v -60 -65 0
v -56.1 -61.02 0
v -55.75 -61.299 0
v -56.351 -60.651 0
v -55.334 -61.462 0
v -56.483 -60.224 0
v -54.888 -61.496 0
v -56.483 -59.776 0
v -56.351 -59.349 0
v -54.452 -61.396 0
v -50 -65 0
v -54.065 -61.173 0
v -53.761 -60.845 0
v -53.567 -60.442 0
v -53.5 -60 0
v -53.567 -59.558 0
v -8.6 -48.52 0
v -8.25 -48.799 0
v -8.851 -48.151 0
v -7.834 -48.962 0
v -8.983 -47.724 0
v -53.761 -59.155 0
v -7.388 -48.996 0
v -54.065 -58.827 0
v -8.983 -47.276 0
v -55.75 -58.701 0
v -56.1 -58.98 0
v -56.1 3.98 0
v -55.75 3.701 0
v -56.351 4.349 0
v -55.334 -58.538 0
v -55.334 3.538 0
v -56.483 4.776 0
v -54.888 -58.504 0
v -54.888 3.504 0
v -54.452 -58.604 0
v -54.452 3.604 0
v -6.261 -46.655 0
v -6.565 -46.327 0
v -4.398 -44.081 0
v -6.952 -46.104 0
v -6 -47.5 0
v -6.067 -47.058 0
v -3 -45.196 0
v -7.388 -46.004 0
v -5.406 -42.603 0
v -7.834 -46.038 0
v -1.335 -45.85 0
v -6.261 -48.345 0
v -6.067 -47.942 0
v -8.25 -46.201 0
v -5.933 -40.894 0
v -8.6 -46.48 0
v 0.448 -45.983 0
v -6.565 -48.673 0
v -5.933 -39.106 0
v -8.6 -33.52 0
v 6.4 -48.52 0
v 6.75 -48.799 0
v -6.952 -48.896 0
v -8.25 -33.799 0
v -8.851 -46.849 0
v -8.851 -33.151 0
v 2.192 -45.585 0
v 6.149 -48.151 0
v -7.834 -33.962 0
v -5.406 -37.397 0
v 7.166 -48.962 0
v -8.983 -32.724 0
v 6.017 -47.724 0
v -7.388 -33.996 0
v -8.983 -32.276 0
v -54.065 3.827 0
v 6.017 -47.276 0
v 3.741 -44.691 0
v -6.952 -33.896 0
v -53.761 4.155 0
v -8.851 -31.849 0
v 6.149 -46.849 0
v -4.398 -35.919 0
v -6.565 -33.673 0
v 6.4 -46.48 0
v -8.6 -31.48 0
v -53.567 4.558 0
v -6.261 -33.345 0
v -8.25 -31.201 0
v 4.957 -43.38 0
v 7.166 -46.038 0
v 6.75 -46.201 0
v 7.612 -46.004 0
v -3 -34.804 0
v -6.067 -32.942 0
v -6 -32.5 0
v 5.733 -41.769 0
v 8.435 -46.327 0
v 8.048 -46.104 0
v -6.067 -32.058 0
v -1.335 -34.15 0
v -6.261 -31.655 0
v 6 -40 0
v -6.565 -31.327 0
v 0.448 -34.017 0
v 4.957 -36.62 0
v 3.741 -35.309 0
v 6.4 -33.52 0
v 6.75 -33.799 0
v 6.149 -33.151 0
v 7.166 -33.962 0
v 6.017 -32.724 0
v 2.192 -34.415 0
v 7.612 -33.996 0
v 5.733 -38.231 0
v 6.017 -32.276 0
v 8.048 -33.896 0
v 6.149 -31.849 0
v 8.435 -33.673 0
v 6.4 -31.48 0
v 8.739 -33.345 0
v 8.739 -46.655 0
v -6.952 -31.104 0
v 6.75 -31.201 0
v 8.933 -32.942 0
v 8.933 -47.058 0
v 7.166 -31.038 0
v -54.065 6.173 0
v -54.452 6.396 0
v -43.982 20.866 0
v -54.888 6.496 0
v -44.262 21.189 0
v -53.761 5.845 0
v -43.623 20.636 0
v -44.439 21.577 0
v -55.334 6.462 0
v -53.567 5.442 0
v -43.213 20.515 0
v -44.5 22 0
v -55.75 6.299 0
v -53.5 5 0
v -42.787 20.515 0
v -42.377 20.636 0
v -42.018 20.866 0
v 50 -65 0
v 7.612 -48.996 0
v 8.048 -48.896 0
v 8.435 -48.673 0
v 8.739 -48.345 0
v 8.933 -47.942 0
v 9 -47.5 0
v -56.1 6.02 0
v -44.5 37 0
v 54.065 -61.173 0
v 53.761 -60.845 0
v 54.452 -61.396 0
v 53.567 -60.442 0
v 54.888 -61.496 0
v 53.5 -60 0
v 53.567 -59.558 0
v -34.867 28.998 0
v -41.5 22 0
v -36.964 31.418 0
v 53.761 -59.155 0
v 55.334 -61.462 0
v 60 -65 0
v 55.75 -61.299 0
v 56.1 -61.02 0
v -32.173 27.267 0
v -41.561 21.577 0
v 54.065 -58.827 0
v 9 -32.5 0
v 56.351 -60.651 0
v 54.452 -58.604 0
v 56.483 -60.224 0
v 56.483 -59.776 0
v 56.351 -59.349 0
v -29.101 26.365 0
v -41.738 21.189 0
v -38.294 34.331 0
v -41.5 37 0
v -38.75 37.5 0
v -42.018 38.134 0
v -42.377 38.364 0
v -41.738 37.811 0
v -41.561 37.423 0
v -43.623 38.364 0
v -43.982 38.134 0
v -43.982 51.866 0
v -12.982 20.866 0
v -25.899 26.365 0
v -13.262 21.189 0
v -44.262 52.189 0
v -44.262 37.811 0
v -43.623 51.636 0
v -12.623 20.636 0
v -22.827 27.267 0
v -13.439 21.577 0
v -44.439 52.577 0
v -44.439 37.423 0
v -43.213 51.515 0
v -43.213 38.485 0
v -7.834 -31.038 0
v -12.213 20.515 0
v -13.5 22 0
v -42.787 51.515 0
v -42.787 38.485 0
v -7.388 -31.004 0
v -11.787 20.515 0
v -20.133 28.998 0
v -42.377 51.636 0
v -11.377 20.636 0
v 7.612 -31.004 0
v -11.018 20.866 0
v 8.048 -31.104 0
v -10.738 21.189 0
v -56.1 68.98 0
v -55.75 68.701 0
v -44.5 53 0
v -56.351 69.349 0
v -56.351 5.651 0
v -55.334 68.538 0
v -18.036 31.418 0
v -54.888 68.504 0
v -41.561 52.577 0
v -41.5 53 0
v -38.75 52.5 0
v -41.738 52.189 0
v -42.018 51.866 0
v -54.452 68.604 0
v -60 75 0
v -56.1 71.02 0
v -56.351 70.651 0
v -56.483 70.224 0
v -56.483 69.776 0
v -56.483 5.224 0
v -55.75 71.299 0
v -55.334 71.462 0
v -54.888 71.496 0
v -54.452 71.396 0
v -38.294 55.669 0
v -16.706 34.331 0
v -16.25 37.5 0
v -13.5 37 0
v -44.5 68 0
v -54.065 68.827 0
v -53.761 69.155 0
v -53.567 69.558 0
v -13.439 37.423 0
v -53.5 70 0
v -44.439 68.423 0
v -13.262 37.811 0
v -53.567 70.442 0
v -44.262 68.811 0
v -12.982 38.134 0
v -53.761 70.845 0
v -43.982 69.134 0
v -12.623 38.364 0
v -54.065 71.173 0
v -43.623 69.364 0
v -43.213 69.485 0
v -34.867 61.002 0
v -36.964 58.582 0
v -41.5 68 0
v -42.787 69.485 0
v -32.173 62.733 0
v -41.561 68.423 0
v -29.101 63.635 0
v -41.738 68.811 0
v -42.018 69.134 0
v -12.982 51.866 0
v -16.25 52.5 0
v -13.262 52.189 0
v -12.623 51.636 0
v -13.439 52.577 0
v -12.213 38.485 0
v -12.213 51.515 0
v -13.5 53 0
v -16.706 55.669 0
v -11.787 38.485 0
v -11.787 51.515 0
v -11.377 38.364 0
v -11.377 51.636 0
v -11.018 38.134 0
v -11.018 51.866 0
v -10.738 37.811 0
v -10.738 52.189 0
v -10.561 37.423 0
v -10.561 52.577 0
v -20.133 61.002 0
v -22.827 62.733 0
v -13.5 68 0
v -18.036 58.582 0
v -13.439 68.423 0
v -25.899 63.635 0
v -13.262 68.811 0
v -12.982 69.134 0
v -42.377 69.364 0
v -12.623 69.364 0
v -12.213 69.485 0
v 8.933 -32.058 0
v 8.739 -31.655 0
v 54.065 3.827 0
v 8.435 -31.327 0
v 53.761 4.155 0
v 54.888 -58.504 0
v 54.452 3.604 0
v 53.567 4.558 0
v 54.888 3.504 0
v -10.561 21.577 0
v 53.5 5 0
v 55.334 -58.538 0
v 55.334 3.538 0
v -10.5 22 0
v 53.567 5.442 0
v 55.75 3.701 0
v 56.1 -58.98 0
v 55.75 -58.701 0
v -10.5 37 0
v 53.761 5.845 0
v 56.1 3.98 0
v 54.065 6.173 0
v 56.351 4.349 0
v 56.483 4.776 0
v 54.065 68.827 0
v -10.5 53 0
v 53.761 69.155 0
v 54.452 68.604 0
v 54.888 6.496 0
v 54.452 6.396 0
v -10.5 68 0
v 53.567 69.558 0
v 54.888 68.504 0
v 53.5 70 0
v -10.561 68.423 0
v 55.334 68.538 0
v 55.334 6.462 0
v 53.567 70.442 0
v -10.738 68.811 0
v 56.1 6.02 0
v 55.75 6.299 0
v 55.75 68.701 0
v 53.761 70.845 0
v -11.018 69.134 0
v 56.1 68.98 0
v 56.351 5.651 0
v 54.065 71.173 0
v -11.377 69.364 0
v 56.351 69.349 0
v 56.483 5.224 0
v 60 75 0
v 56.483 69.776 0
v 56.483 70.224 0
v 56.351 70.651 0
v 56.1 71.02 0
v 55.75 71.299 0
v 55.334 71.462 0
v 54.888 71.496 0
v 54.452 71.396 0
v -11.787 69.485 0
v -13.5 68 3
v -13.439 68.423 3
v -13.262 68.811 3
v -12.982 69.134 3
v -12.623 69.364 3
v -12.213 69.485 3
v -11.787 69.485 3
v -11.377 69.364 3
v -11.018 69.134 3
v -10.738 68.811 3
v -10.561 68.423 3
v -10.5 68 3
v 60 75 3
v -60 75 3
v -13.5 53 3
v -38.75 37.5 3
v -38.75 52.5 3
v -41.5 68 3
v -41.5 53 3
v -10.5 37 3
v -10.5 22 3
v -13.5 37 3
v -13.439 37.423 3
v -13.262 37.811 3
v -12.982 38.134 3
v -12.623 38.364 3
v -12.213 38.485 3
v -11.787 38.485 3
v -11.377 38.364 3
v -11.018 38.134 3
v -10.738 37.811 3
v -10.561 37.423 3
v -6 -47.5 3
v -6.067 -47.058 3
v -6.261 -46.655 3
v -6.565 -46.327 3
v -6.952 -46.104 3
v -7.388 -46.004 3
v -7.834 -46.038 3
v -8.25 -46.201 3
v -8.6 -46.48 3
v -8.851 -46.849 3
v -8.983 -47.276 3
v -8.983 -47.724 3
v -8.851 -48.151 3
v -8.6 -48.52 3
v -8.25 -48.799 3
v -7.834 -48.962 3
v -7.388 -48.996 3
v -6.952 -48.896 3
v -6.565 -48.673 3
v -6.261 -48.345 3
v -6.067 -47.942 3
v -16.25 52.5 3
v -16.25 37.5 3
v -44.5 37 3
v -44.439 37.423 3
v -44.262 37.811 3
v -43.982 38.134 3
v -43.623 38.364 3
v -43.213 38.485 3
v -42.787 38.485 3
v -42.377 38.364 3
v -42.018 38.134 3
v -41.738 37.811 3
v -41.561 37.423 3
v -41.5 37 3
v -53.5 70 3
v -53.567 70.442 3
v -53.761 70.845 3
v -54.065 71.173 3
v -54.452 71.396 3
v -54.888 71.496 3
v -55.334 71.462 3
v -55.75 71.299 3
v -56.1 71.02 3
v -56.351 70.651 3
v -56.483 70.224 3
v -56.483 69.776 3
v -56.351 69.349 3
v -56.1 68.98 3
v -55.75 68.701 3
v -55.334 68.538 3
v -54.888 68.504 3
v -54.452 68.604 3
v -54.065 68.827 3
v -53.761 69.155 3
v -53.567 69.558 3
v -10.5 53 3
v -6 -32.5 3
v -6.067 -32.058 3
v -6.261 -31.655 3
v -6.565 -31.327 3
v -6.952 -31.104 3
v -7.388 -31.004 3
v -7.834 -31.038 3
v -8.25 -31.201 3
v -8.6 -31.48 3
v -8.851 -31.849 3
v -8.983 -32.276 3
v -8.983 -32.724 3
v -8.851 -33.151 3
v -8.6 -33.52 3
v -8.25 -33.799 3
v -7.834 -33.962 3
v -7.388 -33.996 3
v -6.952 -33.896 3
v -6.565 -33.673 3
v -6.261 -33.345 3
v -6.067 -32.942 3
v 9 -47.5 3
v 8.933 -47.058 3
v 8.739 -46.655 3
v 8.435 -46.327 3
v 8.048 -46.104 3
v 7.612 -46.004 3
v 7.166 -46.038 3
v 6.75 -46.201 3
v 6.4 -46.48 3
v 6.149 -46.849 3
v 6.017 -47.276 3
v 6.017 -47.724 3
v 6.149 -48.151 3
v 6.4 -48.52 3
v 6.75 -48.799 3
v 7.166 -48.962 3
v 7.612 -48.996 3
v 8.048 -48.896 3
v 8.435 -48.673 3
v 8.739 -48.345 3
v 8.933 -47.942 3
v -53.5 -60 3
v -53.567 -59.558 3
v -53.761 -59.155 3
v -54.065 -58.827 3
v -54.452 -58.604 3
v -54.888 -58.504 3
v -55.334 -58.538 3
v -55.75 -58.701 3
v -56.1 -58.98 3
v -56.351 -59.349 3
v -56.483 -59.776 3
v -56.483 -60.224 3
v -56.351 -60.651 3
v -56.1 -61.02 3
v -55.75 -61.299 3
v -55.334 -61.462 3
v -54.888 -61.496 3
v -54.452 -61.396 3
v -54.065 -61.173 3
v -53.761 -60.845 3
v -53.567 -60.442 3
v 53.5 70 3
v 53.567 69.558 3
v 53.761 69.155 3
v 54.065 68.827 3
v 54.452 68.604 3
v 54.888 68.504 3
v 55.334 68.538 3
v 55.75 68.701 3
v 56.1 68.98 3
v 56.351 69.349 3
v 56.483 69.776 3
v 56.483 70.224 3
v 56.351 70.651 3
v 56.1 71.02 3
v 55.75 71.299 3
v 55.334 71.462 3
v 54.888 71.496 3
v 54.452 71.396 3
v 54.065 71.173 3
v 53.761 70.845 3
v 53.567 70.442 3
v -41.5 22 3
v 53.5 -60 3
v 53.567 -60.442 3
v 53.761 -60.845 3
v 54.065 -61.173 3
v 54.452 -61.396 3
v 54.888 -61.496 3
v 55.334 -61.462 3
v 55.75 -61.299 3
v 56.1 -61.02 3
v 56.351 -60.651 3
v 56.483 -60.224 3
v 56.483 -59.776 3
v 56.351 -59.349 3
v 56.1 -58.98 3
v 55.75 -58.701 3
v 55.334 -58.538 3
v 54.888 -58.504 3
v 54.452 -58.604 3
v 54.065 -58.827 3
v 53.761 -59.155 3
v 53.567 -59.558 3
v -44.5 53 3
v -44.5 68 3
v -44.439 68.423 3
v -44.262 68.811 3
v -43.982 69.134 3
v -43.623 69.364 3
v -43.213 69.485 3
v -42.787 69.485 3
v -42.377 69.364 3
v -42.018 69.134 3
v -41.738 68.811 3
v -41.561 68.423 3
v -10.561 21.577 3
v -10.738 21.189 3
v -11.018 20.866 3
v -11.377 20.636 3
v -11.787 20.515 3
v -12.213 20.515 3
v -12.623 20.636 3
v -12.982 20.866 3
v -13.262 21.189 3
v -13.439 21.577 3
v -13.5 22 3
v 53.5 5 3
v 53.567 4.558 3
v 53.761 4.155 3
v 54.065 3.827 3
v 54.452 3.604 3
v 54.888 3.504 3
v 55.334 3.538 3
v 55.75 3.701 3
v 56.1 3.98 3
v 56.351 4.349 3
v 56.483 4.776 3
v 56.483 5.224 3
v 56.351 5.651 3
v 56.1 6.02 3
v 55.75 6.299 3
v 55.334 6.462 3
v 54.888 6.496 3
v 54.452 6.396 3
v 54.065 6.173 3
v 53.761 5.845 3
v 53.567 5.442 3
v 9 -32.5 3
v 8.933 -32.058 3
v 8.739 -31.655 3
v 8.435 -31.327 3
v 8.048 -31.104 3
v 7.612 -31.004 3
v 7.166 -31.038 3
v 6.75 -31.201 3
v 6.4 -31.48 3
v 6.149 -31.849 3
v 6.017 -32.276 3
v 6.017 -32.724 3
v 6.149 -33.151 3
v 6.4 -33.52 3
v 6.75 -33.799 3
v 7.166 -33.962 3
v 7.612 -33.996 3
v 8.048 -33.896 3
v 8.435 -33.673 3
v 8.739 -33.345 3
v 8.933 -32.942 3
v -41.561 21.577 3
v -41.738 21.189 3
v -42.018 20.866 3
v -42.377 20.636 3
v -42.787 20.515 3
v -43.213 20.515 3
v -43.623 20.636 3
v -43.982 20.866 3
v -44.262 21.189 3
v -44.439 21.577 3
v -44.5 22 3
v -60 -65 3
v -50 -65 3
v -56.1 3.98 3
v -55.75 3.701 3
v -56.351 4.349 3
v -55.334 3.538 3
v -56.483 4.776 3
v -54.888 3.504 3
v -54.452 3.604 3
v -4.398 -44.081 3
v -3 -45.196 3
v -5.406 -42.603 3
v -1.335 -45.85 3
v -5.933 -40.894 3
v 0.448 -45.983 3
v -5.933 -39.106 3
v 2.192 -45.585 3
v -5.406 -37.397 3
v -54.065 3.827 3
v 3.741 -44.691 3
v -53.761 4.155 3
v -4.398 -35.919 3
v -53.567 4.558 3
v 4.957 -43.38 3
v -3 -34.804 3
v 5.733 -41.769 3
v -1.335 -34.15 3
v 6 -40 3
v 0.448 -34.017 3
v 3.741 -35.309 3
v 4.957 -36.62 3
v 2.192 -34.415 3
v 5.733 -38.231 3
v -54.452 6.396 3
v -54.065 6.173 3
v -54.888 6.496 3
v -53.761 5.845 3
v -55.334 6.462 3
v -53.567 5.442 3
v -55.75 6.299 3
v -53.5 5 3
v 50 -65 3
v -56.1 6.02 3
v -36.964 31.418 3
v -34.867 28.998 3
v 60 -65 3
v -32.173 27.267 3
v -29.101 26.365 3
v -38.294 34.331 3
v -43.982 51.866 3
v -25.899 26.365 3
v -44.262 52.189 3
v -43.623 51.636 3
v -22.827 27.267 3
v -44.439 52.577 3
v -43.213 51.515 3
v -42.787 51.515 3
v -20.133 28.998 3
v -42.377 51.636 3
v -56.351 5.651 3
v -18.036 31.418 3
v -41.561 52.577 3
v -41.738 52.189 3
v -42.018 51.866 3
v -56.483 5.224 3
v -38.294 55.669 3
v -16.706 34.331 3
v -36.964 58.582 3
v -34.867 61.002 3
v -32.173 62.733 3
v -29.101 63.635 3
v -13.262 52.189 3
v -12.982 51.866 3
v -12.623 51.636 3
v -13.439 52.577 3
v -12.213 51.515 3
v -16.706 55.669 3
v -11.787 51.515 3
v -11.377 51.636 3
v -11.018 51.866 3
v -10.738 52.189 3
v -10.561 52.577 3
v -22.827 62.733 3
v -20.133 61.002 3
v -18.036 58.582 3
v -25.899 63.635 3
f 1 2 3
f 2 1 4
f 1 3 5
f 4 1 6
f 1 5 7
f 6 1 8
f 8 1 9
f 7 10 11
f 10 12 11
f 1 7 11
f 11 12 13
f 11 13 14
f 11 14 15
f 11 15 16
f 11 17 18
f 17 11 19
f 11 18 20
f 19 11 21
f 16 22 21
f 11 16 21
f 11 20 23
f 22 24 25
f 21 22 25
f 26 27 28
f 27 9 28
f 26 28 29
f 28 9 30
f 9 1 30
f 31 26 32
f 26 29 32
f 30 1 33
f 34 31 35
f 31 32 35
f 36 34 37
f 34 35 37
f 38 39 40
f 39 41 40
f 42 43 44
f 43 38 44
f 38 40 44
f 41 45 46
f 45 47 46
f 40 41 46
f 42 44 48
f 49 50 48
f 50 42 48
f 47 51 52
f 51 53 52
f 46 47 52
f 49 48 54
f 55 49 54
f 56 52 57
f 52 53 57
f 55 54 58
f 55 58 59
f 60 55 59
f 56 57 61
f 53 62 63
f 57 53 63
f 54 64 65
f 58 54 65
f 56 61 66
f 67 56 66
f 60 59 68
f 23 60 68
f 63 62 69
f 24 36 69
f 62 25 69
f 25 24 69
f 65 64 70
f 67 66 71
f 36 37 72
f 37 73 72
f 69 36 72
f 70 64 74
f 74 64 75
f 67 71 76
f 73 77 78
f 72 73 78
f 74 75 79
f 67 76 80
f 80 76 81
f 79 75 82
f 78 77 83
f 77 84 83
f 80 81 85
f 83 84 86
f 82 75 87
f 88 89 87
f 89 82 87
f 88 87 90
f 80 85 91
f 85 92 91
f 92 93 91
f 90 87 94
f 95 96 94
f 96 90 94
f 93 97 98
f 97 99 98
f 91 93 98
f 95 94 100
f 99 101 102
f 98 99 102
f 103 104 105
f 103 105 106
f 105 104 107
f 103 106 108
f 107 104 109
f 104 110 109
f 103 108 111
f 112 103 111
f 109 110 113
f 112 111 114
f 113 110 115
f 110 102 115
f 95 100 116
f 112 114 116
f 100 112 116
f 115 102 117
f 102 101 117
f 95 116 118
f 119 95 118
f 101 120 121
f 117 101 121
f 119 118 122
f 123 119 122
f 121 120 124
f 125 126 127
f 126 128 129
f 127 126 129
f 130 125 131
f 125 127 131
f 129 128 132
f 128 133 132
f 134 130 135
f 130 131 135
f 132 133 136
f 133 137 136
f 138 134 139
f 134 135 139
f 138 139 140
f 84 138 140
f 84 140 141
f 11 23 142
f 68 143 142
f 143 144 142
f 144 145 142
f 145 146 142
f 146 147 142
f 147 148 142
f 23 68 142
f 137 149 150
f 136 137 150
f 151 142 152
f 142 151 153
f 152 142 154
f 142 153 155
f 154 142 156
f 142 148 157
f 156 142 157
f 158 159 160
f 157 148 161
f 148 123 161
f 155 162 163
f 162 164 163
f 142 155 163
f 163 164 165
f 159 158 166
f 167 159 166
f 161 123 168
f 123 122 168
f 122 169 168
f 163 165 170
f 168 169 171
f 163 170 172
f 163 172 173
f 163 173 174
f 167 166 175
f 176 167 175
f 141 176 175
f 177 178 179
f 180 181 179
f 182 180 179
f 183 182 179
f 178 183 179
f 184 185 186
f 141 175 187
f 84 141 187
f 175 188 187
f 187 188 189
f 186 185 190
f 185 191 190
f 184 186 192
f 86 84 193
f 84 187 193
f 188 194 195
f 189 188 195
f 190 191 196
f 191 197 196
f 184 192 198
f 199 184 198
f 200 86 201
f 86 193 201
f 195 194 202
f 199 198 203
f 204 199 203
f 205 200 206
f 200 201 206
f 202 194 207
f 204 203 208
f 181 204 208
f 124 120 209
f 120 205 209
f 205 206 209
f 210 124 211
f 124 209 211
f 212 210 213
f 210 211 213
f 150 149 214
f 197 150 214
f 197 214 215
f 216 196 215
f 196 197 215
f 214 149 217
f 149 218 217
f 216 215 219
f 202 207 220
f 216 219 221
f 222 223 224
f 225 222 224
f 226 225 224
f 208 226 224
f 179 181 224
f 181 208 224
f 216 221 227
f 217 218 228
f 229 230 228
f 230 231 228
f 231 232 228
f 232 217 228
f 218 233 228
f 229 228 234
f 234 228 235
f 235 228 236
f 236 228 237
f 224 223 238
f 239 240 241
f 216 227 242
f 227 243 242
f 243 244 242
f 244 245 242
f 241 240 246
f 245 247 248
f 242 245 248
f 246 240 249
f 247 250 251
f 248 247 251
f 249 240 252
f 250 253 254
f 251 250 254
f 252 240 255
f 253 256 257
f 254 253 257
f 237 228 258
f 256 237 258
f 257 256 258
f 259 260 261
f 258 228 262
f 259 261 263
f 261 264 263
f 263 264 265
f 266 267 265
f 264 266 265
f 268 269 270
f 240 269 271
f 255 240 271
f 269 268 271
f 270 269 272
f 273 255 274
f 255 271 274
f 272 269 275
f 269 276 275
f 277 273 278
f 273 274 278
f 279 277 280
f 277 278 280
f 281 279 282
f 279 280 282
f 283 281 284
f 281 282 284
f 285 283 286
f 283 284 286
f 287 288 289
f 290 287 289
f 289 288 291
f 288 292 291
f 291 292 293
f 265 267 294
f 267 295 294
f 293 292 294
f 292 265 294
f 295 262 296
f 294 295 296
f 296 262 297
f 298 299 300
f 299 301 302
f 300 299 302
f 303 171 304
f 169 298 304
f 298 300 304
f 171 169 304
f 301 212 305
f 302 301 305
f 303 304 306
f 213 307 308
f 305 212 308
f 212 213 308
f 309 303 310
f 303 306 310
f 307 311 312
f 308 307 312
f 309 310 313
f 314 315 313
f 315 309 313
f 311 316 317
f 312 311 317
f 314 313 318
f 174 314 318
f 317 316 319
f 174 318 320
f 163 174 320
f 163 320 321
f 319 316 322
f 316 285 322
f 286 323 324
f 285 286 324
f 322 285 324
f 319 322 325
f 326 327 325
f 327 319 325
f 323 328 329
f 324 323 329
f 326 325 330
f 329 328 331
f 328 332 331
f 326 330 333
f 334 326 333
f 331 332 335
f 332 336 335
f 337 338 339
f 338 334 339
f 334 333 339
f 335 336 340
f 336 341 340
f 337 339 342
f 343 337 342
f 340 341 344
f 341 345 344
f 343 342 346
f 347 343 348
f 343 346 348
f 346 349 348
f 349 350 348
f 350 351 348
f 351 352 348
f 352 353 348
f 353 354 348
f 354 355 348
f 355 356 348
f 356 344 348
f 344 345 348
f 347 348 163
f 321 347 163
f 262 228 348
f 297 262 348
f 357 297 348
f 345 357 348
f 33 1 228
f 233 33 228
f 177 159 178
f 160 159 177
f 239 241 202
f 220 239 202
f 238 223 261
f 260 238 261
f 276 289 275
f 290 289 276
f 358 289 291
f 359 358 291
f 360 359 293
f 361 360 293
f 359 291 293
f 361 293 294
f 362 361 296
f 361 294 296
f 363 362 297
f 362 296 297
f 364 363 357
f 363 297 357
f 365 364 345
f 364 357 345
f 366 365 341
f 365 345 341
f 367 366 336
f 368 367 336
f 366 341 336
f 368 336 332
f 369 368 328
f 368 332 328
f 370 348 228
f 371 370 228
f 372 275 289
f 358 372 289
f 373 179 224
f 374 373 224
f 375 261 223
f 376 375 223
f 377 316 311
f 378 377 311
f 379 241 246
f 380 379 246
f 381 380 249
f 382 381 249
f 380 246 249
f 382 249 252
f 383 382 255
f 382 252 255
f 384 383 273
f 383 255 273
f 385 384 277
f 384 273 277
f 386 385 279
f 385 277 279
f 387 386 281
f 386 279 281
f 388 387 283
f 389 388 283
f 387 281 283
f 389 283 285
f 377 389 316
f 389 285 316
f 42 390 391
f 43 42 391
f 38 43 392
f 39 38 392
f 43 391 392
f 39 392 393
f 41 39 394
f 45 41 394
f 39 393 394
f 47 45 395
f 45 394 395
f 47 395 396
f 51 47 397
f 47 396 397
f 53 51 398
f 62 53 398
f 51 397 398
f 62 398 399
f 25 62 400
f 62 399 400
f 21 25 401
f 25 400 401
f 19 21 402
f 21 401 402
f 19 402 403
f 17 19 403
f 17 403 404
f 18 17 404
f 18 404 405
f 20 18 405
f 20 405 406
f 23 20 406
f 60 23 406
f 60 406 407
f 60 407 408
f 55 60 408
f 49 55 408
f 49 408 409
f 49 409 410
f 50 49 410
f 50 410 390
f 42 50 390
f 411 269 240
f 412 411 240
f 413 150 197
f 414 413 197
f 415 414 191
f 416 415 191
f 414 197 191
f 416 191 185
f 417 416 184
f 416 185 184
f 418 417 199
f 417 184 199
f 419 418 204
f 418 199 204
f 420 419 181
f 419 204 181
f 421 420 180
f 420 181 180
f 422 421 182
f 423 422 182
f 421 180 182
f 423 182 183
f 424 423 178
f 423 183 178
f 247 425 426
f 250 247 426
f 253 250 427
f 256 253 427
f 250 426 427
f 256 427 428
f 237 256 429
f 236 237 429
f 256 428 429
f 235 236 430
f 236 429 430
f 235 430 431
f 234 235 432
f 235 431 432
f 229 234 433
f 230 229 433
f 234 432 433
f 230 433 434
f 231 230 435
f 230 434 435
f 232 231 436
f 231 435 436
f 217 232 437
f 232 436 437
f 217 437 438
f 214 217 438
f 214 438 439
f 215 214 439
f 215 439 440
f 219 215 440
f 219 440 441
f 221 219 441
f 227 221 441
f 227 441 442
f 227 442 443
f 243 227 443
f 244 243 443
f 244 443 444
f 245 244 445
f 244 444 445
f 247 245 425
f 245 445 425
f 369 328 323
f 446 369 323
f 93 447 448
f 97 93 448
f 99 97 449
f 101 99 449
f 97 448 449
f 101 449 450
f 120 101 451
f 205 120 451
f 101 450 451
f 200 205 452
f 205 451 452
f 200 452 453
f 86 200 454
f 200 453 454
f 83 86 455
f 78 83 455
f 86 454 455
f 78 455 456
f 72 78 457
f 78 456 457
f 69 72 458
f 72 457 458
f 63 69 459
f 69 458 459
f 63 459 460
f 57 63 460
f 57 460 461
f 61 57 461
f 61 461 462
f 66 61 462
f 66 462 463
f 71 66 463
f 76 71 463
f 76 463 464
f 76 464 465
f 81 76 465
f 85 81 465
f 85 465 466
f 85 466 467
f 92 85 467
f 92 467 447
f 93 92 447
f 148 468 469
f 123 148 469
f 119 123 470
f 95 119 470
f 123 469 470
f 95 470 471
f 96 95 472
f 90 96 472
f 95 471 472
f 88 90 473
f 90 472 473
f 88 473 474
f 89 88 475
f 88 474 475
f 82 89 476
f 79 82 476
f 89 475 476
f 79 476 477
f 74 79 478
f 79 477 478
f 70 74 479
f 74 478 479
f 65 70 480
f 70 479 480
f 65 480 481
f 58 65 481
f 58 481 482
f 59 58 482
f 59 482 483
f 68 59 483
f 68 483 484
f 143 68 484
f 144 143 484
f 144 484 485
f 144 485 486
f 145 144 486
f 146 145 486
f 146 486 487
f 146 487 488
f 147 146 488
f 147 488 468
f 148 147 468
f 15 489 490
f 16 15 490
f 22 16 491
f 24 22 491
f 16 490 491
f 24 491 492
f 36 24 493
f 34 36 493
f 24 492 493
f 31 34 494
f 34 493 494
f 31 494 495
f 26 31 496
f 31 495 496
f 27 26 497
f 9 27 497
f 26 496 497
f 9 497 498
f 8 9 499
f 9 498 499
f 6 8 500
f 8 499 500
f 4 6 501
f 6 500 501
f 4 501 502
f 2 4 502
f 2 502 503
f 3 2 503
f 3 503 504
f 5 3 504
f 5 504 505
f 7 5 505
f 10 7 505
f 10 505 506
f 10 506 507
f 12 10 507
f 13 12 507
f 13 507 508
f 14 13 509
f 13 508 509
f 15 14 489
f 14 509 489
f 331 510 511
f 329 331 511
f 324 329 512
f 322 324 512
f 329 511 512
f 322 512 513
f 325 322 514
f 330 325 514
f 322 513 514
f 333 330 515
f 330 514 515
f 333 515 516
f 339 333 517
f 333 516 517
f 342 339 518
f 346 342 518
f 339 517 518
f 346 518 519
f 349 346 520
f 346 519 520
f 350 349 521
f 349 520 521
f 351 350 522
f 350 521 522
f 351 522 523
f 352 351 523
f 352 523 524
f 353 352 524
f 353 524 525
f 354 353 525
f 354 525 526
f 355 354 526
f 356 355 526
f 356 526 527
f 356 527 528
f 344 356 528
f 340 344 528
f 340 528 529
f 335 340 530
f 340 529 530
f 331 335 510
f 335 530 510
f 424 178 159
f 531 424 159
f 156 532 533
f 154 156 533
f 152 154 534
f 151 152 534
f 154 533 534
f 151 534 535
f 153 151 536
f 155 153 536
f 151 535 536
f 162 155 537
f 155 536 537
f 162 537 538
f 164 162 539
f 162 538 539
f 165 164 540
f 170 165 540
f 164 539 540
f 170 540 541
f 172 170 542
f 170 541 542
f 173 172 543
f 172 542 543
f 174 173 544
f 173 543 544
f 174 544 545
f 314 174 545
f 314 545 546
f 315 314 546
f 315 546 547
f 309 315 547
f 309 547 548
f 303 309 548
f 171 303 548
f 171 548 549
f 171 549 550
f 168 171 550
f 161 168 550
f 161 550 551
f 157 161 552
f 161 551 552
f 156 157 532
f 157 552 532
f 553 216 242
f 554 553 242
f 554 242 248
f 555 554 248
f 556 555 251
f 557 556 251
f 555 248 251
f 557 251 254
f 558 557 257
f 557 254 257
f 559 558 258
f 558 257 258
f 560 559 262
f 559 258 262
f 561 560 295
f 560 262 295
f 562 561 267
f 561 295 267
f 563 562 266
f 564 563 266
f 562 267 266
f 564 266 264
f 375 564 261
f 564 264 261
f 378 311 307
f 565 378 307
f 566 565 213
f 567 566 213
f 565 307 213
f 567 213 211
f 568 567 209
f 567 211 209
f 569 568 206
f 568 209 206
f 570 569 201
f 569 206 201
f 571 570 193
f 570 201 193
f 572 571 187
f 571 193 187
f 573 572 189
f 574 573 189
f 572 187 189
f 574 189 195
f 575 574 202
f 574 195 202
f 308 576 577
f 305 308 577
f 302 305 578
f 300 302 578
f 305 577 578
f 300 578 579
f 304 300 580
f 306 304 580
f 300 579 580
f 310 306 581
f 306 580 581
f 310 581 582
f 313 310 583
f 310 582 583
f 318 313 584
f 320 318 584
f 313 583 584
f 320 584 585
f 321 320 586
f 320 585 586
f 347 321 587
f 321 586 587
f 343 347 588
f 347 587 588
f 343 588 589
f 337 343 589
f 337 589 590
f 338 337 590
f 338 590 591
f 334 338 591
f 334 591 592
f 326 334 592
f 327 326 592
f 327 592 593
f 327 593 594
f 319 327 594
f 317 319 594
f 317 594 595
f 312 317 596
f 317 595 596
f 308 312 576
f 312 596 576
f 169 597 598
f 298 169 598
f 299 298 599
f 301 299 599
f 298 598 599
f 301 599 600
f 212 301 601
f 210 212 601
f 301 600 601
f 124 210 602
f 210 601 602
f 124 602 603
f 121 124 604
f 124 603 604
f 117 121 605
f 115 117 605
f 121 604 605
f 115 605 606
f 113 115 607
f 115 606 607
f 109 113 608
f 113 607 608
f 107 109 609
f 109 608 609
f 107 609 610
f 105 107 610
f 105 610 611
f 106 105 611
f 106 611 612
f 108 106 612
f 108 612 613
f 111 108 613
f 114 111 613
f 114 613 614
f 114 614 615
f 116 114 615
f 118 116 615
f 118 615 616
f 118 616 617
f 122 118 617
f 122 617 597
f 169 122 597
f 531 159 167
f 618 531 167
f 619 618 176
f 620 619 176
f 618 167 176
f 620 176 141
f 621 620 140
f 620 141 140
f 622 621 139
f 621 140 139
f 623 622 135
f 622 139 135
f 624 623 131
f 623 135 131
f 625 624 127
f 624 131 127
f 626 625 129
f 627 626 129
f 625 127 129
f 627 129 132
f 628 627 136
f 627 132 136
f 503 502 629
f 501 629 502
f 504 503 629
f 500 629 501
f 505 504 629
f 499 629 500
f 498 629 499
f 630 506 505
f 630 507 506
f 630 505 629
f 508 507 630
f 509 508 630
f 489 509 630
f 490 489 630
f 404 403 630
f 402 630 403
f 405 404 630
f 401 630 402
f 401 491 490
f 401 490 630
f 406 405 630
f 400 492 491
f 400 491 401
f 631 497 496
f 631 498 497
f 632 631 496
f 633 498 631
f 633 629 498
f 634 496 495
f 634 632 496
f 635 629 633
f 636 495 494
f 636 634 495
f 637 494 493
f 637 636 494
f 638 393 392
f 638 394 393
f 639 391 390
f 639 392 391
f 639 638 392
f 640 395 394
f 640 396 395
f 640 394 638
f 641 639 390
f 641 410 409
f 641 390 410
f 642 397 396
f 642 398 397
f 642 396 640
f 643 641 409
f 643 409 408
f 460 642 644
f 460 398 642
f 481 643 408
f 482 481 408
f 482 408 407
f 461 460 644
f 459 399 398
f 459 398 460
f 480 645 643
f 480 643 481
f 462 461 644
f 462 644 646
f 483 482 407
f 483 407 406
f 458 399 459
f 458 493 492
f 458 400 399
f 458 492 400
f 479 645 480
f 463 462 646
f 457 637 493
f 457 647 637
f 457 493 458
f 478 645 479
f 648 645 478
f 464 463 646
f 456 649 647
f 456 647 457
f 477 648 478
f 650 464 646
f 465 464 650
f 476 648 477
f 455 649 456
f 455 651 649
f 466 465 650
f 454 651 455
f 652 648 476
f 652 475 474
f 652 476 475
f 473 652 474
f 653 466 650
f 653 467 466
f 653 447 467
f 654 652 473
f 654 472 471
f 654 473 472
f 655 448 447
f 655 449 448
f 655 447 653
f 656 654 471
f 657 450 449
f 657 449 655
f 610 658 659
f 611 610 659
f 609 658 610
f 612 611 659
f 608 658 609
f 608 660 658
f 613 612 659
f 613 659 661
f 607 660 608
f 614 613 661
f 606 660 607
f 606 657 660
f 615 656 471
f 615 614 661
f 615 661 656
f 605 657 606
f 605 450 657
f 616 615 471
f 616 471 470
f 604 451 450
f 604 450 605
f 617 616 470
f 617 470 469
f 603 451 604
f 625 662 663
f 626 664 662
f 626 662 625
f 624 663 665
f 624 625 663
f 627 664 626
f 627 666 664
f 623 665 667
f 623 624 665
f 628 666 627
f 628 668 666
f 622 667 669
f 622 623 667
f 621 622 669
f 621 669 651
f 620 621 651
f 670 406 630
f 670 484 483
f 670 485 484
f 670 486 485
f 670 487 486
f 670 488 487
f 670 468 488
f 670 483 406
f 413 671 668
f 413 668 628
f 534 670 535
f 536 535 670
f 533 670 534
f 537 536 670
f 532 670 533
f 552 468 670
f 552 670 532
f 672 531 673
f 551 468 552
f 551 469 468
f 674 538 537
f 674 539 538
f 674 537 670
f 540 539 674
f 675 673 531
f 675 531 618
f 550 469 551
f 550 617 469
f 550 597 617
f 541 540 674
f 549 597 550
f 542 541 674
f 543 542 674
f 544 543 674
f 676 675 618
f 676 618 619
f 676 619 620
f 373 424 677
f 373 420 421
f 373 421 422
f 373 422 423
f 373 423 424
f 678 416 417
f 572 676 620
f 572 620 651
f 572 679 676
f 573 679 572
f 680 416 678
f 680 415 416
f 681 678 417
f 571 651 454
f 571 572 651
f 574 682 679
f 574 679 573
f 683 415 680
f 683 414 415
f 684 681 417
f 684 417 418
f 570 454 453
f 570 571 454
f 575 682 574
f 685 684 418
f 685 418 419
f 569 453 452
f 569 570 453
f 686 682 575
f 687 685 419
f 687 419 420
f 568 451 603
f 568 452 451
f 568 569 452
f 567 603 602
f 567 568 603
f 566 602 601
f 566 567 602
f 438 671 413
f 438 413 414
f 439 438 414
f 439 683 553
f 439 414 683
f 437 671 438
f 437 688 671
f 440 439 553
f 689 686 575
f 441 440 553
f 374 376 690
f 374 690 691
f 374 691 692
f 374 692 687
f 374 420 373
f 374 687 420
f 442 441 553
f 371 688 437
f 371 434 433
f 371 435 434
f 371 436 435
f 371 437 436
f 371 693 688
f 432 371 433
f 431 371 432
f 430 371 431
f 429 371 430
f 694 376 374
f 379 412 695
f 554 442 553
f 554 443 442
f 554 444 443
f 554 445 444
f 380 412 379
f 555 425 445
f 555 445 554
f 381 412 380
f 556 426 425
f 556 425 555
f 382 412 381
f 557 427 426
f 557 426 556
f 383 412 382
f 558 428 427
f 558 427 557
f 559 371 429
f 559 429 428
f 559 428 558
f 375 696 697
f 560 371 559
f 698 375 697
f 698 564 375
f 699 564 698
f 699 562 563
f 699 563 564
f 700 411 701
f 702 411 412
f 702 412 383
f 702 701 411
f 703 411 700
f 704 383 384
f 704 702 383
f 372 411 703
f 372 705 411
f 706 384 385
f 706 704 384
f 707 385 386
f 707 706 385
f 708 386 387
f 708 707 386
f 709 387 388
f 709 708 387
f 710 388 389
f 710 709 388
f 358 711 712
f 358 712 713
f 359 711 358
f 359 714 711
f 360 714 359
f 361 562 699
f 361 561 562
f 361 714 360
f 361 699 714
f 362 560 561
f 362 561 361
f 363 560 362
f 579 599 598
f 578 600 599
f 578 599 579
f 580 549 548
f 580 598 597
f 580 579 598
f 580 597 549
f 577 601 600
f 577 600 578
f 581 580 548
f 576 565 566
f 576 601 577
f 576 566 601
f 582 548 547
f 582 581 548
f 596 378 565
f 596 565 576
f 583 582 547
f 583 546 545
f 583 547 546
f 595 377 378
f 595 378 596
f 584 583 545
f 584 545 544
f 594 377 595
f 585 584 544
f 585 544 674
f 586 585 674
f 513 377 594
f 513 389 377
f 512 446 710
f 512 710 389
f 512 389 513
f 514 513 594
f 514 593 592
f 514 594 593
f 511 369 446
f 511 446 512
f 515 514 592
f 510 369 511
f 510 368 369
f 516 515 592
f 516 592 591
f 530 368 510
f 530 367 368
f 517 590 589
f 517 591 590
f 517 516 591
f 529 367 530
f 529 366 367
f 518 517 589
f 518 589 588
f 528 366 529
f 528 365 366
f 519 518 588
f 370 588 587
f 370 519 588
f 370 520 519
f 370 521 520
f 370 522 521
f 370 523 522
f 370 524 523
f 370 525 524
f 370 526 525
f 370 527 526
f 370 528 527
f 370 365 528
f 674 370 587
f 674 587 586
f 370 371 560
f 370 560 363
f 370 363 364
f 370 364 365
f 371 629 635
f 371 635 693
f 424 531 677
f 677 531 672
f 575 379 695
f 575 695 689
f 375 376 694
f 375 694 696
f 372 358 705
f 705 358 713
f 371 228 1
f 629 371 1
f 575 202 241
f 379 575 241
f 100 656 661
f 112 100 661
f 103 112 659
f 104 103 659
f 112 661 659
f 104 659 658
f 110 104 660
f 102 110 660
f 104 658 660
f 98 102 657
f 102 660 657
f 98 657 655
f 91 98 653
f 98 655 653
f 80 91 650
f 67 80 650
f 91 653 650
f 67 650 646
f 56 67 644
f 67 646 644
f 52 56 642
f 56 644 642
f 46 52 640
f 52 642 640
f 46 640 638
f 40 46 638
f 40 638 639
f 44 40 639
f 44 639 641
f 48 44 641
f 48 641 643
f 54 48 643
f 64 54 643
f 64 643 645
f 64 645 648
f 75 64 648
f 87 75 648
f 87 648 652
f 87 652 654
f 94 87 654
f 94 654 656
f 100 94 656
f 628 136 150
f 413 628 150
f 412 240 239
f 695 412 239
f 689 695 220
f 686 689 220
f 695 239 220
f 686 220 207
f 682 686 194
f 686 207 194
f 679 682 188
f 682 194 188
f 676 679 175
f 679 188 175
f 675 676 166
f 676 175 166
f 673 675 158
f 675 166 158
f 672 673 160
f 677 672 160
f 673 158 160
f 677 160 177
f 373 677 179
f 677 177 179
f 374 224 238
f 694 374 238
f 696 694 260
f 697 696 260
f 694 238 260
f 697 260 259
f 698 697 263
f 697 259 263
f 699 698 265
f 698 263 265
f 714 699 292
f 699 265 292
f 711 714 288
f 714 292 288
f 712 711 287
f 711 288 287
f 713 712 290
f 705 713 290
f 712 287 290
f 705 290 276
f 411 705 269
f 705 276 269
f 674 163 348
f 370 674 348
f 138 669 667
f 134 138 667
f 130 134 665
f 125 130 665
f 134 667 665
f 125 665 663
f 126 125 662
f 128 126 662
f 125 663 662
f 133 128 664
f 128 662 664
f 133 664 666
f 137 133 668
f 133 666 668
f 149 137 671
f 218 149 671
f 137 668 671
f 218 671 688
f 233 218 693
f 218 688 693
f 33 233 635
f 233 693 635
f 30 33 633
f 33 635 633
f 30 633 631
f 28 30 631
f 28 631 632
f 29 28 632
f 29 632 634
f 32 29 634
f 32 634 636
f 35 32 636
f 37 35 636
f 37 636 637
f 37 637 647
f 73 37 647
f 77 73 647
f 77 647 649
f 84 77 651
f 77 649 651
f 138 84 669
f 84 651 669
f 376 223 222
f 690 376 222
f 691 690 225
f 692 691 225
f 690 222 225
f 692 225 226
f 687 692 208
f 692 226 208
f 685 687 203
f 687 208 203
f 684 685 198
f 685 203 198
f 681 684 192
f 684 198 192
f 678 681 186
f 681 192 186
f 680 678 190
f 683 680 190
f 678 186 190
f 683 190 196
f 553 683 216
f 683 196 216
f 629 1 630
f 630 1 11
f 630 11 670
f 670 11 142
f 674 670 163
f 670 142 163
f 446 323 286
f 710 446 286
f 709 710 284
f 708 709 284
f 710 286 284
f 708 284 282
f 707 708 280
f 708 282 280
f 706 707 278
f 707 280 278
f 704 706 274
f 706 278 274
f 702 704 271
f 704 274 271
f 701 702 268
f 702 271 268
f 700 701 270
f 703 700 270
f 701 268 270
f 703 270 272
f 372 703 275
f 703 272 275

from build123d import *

# Parameters (mm, degrees)
BOSS_EXTRU_1_DEPTH      = 3
ESQUISSE2_R             = 1.5
ENL_V_MAT_EXTRU_2_DEPTH = 3
ESQUISSE3_R             = 6
ESQUISSE3_R_2           = 1.5
ENL_V_MAT_EXTRU_3_DEPTH = 10
ESQUISSE4_W             = 100
ESQUISSE4_H             = 11.457187309
ENL_V_MAT_EXTRU_4_DEPTH = 10


with BuildPart() as part:
    # Esquisse1 → Boss.-Extru.1 (new body)
    with BuildSketch(Plane.XY):
        Polygon((-50, -75), (50, -75), (50, -65), (60, -65), (60, 75), (-60, 75), (-60, -65), (-50, -65), align=None)
        with BuildLine():
            ThreePointArc((-41.5, 22), (-43, 20.5), (-44.5, 22))
            Line((-44.5, 22), (-44.5, 37))
            ThreePointArc((-44.5, 37), (-43, 38.5), (-41.5, 37))
            Line((-41.5, 37), (-41.5, 22))
        make_face(mode=Mode.SUBTRACT)
        with BuildLine():
            Line((-10.5, 37), (-10.5, 22))
            ThreePointArc((-10.5, 22), (-12, 20.5), (-13.5, 22))
            Line((-13.5, 22), (-13.5, 37))
            ThreePointArc((-13.5, 37), (-12, 38.5), (-10.5, 37))
        make_face(mode=Mode.SUBTRACT)
        with BuildLine():
            ThreePointArc((-41.5, 53), (-43, 51.5), (-44.5, 53))
            Line((-44.5, 53), (-44.5, 68))
            ThreePointArc((-44.5, 68), (-43, 69.5), (-41.5, 68))
            Line((-41.5, 68), (-41.5, 53))
        make_face(mode=Mode.SUBTRACT)
        with BuildLine():
            ThreePointArc((-16.25, 37.5), (-27.5, 26.25), (-38.75, 37.5))
            Line((-38.75, 37.5), (-38.75, 52.5))
            ThreePointArc((-38.75, 52.5), (-27.5, 63.75), (-16.25, 52.5))
            Line((-16.25, 52.5), (-16.25, 37.5))
        make_face(mode=Mode.SUBTRACT)
        with BuildLine():
            Line((-10.5, 68), (-10.5, 53))
            ThreePointArc((-10.5, 53), (-12, 51.5), (-13.5, 53))
            Line((-13.5, 53), (-13.5, 68))
            ThreePointArc((-13.5, 68), (-12, 69.5), (-10.5, 68))
        make_face(mode=Mode.SUBTRACT)
    extrude(amount=BOSS_EXTRU_1_DEPTH)

    # Esquisse2 → Enlèv. mat.-Extru.2 (cut)
    with BuildSketch(Plane.XY.offset(3)):
        with Locations((45, -70)):
            Circle(ESQUISSE2_R)
        with Locations((-55, -60)):
            Circle(ESQUISSE2_R)
        with Locations((-55, 5)):
            Circle(ESQUISSE2_R)
        with Locations((-55, 70)):
            Circle(ESQUISSE2_R)
        with Locations((22.5, -70)):
            Circle(ESQUISSE2_R)
        with Locations((0, -70)):
            Circle(ESQUISSE2_R)
        with Locations((-22.5, -70)):
            Circle(ESQUISSE2_R)
        with Locations((-45, -70)):
            Circle(ESQUISSE2_R)
        with Locations(Location((55, -60, 0), (0, 0, 180))):
            Circle(ESQUISSE2_R)
        with Locations(Location((55, 5, 0), (0, 0, 180))):
            Circle(ESQUISSE2_R)
        with Locations(Location((55, 70, 0), (0, 0, 180))):
            Circle(ESQUISSE2_R)
    extrude(amount=-ENL_V_MAT_EXTRU_2_DEPTH, mode=Mode.SUBTRACT)

    # Esquisse3 → Enlèv. mat.-Extru.3 (cut)
    with BuildSketch(Plane.XY.offset(3)):
        with Locations((0, -40)):
            Circle(ESQUISSE3_R)
        with Locations((-7.5, -32.5)):
            Circle(ESQUISSE3_R_2)
        with Locations((7.5, -32.5)):
            Circle(ESQUISSE3_R_2)
        with Locations((7.5, -47.5)):
            Circle(ESQUISSE3_R_2)
        with Locations((-7.5, -47.5)):
            Circle(ESQUISSE3_R_2)
    extrude(amount=-ENL_V_MAT_EXTRU_3_DEPTH, mode=Mode.SUBTRACT)

    # Esquisse4 → Enlèv. mat.-Extru.4 (cut)
    with BuildSketch(Plane.XY.offset(3)):
        with Locations((0, -70.728593655)):
            Rectangle(ESQUISSE4_W, ESQUISSE4_H)
    extrude(amount=-ENL_V_MAT_EXTRU_4_DEPTH, mode=Mode.SUBTRACT)


solid = part.part
